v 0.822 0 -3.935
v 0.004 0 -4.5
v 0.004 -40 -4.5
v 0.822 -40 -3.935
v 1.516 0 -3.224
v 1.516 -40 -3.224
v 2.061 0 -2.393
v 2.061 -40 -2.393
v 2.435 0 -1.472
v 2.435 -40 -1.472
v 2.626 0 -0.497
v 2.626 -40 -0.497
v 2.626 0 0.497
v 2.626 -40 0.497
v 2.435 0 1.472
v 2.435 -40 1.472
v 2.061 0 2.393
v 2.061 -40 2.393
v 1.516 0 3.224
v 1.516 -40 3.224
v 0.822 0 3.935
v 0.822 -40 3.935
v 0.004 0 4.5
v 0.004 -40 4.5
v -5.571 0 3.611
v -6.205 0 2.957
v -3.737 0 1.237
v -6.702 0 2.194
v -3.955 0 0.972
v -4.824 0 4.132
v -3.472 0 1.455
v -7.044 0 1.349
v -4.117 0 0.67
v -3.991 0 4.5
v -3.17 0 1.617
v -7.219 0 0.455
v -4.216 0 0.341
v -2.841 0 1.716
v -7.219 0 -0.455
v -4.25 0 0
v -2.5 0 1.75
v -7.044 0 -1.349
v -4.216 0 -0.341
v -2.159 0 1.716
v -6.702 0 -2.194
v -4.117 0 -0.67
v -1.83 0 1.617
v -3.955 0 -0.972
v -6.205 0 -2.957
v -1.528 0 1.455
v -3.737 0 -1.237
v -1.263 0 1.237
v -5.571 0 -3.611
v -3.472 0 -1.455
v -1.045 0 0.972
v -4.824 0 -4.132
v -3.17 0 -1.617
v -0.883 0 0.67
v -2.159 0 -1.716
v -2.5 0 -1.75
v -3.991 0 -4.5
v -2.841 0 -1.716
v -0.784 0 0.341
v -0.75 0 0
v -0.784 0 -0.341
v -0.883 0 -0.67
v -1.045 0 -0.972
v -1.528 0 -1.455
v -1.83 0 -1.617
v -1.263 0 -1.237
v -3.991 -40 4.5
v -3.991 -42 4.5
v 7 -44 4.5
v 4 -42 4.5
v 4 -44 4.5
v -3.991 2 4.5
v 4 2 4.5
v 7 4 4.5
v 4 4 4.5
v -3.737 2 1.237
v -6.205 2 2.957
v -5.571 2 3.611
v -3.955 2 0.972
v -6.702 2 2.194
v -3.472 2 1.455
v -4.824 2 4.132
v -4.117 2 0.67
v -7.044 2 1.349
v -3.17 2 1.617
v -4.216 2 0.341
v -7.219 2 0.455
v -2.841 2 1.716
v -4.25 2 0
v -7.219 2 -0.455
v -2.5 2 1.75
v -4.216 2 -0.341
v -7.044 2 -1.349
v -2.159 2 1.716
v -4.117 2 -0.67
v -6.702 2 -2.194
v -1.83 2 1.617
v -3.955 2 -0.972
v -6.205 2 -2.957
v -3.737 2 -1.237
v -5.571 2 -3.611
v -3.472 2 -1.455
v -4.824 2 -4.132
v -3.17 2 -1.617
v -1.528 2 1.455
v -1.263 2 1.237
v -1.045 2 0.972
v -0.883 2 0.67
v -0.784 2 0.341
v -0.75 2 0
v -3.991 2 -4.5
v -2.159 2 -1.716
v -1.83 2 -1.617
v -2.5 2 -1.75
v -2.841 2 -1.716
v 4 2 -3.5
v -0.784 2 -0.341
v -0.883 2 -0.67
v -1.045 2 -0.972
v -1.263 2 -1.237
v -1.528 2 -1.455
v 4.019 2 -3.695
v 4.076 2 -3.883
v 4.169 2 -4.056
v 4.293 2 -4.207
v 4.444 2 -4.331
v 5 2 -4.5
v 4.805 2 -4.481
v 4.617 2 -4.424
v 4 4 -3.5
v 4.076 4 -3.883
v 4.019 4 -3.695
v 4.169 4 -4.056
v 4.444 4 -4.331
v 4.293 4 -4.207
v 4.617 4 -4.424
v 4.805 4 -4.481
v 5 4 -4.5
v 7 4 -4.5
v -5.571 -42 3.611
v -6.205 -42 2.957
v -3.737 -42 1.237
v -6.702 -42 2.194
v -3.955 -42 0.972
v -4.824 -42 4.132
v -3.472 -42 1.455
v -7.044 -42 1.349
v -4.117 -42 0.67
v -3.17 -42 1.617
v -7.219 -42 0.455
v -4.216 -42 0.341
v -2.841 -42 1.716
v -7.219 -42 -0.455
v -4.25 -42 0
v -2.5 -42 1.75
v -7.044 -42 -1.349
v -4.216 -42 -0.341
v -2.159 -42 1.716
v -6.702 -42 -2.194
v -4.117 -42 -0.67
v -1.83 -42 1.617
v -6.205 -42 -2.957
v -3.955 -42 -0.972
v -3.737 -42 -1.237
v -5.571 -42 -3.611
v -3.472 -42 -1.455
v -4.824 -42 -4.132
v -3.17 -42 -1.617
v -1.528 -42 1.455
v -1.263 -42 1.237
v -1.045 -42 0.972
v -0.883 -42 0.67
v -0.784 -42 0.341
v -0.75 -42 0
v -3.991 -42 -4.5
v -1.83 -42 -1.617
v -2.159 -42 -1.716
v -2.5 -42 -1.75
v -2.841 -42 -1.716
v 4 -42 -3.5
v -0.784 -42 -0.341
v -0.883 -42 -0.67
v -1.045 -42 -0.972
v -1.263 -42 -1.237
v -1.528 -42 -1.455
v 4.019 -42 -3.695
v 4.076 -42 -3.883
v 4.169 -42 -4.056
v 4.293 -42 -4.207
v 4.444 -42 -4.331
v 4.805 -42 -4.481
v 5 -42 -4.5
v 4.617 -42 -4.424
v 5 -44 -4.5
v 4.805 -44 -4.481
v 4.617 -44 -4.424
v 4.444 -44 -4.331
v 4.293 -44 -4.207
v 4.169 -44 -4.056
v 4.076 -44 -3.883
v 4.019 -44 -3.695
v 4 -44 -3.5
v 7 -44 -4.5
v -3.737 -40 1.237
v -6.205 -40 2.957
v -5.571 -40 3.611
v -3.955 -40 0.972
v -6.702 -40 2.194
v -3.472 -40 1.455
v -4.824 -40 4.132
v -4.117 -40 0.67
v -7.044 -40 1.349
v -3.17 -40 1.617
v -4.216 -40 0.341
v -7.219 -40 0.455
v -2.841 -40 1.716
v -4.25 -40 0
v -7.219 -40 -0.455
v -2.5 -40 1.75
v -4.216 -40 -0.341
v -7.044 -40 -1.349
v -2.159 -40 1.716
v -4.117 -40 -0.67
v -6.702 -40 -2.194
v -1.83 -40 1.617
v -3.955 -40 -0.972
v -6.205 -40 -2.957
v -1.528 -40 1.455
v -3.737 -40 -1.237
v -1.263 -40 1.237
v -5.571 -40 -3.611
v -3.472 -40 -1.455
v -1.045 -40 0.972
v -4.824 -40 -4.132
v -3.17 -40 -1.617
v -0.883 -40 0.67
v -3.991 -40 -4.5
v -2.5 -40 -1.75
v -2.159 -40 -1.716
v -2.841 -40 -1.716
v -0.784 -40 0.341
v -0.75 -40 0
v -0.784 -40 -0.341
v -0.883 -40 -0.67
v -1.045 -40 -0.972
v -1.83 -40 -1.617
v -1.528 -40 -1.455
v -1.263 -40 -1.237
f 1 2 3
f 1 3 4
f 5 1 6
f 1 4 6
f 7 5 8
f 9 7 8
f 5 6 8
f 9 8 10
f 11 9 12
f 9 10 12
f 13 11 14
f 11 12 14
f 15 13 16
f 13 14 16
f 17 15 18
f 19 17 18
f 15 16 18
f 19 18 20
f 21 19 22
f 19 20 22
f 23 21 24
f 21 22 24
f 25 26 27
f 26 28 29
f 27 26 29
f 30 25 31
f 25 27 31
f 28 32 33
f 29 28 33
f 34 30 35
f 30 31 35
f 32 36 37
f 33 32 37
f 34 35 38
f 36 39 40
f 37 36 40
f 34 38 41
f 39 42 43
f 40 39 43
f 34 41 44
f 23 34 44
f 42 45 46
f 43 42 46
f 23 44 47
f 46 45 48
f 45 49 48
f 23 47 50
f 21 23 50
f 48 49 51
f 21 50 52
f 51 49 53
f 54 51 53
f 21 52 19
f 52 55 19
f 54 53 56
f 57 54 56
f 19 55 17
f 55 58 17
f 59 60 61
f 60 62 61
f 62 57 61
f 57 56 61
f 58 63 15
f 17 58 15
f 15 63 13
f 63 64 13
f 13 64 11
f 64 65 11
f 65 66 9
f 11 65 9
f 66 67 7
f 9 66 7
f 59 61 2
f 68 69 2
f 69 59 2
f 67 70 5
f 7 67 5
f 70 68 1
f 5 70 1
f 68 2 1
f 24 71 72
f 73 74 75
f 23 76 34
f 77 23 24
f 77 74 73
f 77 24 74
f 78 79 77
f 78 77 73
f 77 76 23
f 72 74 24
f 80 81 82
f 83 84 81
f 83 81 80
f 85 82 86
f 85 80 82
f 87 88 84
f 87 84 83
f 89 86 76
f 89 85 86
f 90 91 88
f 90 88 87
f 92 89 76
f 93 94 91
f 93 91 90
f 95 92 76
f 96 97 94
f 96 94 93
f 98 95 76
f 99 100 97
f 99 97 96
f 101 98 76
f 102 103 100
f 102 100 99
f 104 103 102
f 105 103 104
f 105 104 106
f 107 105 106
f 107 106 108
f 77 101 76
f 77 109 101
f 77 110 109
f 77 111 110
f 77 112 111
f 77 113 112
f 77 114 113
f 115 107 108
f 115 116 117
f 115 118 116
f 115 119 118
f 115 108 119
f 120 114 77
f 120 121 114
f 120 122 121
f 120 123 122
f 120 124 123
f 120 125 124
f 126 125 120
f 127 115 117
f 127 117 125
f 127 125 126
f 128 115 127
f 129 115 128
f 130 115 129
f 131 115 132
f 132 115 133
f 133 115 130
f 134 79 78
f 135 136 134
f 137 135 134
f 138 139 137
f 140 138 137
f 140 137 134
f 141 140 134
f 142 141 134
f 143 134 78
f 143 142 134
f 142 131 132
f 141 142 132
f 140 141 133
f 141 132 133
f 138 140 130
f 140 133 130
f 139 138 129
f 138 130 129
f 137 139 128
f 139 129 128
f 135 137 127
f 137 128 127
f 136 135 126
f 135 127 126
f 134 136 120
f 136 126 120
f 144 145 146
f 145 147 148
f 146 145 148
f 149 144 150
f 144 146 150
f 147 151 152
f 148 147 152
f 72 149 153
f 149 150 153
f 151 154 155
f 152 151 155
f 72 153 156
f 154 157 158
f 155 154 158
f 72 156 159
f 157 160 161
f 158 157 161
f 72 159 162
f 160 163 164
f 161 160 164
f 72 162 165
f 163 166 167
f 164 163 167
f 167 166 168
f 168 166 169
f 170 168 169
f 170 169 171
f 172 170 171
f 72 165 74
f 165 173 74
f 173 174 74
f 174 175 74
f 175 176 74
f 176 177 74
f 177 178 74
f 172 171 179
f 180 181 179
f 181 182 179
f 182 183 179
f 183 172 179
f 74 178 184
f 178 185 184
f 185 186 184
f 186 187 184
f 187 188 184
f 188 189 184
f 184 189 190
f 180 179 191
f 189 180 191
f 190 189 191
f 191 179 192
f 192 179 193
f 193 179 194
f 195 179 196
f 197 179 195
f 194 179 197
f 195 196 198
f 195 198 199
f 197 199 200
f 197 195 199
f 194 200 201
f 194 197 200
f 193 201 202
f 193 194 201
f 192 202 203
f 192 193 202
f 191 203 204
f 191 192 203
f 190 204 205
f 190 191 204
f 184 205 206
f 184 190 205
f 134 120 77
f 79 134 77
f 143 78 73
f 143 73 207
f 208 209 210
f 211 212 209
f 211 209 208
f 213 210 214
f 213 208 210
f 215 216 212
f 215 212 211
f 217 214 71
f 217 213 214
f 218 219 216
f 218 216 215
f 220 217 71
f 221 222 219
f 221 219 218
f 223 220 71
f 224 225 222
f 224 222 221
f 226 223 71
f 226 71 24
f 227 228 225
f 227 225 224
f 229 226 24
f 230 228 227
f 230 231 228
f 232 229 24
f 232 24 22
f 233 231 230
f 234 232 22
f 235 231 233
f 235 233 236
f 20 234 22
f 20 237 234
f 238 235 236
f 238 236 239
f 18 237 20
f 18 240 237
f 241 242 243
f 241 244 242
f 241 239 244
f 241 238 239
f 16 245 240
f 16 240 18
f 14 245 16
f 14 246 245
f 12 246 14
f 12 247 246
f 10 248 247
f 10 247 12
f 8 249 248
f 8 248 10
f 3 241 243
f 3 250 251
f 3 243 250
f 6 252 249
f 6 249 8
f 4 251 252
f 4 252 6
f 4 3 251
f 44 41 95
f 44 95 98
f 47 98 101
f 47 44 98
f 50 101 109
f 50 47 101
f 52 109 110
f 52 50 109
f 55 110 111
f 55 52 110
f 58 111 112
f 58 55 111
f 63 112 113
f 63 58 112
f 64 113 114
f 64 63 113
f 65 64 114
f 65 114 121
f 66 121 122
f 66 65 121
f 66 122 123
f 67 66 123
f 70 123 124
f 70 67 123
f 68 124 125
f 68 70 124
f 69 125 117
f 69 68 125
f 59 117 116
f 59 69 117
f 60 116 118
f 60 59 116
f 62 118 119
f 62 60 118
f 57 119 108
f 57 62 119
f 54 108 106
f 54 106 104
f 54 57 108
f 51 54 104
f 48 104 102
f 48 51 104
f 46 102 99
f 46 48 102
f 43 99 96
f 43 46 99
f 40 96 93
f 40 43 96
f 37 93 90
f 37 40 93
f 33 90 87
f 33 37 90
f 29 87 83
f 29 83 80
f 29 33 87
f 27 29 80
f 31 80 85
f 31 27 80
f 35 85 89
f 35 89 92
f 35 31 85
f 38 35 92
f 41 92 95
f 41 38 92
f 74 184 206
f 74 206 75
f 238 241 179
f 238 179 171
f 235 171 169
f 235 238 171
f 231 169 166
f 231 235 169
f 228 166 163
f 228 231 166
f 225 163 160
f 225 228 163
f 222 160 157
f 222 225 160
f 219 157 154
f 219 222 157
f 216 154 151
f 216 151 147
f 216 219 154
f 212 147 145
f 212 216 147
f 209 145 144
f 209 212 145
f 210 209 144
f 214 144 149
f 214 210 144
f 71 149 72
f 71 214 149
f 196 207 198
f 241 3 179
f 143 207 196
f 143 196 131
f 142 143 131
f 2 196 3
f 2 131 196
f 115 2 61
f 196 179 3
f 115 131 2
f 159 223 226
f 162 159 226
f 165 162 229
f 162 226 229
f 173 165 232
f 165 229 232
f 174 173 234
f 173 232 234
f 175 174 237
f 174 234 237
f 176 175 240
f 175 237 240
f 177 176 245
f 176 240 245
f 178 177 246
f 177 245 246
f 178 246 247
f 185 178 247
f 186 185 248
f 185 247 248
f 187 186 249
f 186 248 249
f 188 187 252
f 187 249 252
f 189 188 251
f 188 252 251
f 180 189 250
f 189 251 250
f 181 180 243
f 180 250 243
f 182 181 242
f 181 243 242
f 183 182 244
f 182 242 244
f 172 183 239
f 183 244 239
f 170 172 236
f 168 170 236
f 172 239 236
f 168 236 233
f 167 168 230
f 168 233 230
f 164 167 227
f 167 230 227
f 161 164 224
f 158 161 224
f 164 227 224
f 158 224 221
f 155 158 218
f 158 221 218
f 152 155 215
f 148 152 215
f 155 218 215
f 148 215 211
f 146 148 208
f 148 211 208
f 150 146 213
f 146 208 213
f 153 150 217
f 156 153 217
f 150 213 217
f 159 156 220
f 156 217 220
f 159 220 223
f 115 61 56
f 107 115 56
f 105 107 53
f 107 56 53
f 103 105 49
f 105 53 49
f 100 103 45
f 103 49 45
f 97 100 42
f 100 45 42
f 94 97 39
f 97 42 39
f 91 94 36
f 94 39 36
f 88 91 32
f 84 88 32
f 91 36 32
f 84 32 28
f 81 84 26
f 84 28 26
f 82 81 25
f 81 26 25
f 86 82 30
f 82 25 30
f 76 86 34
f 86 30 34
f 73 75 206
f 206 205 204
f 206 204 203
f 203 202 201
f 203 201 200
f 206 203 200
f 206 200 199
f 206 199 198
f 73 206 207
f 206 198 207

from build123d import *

# Parameters (mm, degrees)
SKETCH1_R           = 1.75
BOSS_EXTRUDE3_DEPTH = 2
BOSS_EXTRUDE4_DEPTH = 20
BOSS_EXTRUDE5_DEPTH = 4


with BuildPart() as part:
    # Sketch1 → Boss-Extrude3 (new body)
    with BuildSketch(Plane(origin=(0, 0, 0), x_dir=(1, 0, 0), z_dir=(0, 1, 0))):
        with BuildLine():
            ThreePointArc((-3.991008085, 4.5), (-7.240580672, 0), (-3.991008085, -4.5))
            Line((-3.991008085, -4.5), (7, -4.5))
            Line((7, -4.5), (7, 4.5))
            Line((7, 4.5), (-3.991008085, 4.5))
        make_face()
        with Locations((-2.5, 0)):
            Circle(SKETCH1_R, mode=Mode.SUBTRACT)
    extrude(amount=BOSS_EXTRUDE3_DEPTH)

    # Sketch1<3> → Boss-Extrude4 (add)
    with BuildSketch(Plane(origin=(0, 0, 0), x_dir=(1, 0, 0), z_dir=(0, 1, 0))):
        with BuildLine():
            ThreePointArc((0.004495957, 4.5), (2.65, 0), (0.004495957, -4.5))
            Line((0.004495957, -4.5), (7, -4.5))
            Line((7, -4.5), (7, 4.5))
            Line((7, 4.5), (0.004495957, 4.5))
        make_face()
    extrude(amount=-BOSS_EXTRUDE4_DEPTH)

    # Sketch1<5> → Boss-Extrude5 (add)
    with BuildSketch(Plane(origin=(0, 0, 0), x_dir=(1, 0, 0), z_dir=(0, 1, 0))):
        with BuildLine():
            Line((7, 4.5), (5, 4.5))
            ThreePointArc((5, 4.5), (4.292893219, 4.207106781), (4, 3.5))
            Line((4, 3.5), (4, -4.5))
            Line((4, -4.5), (7, -4.5))
            Line((7, -4.5), (7, 4.5))
        make_face()
    extrude(amount=BOSS_EXTRUDE5_DEPTH)

    # Mirror1: part across plane


with BuildPart() as part_1:
    add(part.part)
    add(part.part.mirror(Plane.ZX.offset(-20)))


solid = part_1.part
